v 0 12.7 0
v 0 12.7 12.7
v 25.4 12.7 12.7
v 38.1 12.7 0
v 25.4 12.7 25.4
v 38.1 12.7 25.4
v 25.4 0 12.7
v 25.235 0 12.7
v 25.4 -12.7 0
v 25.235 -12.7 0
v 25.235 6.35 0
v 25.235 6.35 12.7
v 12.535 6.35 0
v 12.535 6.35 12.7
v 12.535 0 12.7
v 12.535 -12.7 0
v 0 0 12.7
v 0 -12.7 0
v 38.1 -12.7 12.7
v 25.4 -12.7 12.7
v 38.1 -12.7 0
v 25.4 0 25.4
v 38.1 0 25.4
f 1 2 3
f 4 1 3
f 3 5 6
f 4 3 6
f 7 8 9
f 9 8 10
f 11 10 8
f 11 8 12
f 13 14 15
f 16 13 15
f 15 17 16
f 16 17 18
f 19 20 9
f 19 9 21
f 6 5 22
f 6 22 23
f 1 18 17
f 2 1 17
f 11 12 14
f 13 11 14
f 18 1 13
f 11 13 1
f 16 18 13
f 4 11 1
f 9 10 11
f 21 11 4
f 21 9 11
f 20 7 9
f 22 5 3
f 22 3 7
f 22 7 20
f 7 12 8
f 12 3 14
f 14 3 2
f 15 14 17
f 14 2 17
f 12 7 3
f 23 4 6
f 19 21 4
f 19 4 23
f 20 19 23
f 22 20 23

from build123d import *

# Parameters (mm, degrees)
F0_W     = 38.1
F0_H     = 25.4
F1_DEPTH = 12.7
F3_DEPTH = 25.401
F5_DEPTH = 12.8647734687
F6_W     = 25.4
F6_H     = 12.7
F7_DEPTH = 25.4
F9_DEPTH = 25.4


with BuildPart() as f1:
    # F0 (on Front) → F1 (new body, symmetric)
    with BuildSketch(Plane.XZ):
        with Locations((19.05, 12.7)):
            Rectangle(F0_W, F0_H)
    extrude(amount=F1_DEPTH, both=True)

    # F2 (on face) → F3 (cut, through all)
    with BuildSketch(Plane.XY.offset(25.4)):
        Polygon((12.5352265313, -12.7), (19.05, -12.7), (25.2352265313, -12.7), (25.2352265313, 6.35), (12.5352265313, 6.35), align=None)
    extrude(amount=-F3_DEPTH, mode=Mode.SUBTRACT)

    # F4 (on face) → F5 (cut, through all)
    with BuildSketch(Plane.YZ.offset(38.1)):
        Polygon((0, 25.4), (-12.7, 25.4), (-12.7, 12.7), align=None)
    extrude(amount=-F5_DEPTH, mode=Mode.SUBTRACT)

    # F6 (on face) → F7 (cut)
    with BuildSketch(Plane(origin=(0, 0, 0), x_dir=(0, -1, 0), z_dir=(-1, 0, 0))):
        with Locations((0, 19.05)):
            Rectangle(F6_W, F6_H)
    extrude(amount=-F7_DEPTH, mode=Mode.SUBTRACT)

    # F8 (on face) → F9 (cut)
    with BuildSketch(Plane(origin=(0, 0, 0), x_dir=(0, -1, 0), z_dir=(-1, 0, 0))):
        Polygon((0, 12.7), (12.7, 0), (12.7, 12.7), align=None)
    extrude(amount=-F9_DEPTH, mode=Mode.SUBTRACT)


solid = f1.part
